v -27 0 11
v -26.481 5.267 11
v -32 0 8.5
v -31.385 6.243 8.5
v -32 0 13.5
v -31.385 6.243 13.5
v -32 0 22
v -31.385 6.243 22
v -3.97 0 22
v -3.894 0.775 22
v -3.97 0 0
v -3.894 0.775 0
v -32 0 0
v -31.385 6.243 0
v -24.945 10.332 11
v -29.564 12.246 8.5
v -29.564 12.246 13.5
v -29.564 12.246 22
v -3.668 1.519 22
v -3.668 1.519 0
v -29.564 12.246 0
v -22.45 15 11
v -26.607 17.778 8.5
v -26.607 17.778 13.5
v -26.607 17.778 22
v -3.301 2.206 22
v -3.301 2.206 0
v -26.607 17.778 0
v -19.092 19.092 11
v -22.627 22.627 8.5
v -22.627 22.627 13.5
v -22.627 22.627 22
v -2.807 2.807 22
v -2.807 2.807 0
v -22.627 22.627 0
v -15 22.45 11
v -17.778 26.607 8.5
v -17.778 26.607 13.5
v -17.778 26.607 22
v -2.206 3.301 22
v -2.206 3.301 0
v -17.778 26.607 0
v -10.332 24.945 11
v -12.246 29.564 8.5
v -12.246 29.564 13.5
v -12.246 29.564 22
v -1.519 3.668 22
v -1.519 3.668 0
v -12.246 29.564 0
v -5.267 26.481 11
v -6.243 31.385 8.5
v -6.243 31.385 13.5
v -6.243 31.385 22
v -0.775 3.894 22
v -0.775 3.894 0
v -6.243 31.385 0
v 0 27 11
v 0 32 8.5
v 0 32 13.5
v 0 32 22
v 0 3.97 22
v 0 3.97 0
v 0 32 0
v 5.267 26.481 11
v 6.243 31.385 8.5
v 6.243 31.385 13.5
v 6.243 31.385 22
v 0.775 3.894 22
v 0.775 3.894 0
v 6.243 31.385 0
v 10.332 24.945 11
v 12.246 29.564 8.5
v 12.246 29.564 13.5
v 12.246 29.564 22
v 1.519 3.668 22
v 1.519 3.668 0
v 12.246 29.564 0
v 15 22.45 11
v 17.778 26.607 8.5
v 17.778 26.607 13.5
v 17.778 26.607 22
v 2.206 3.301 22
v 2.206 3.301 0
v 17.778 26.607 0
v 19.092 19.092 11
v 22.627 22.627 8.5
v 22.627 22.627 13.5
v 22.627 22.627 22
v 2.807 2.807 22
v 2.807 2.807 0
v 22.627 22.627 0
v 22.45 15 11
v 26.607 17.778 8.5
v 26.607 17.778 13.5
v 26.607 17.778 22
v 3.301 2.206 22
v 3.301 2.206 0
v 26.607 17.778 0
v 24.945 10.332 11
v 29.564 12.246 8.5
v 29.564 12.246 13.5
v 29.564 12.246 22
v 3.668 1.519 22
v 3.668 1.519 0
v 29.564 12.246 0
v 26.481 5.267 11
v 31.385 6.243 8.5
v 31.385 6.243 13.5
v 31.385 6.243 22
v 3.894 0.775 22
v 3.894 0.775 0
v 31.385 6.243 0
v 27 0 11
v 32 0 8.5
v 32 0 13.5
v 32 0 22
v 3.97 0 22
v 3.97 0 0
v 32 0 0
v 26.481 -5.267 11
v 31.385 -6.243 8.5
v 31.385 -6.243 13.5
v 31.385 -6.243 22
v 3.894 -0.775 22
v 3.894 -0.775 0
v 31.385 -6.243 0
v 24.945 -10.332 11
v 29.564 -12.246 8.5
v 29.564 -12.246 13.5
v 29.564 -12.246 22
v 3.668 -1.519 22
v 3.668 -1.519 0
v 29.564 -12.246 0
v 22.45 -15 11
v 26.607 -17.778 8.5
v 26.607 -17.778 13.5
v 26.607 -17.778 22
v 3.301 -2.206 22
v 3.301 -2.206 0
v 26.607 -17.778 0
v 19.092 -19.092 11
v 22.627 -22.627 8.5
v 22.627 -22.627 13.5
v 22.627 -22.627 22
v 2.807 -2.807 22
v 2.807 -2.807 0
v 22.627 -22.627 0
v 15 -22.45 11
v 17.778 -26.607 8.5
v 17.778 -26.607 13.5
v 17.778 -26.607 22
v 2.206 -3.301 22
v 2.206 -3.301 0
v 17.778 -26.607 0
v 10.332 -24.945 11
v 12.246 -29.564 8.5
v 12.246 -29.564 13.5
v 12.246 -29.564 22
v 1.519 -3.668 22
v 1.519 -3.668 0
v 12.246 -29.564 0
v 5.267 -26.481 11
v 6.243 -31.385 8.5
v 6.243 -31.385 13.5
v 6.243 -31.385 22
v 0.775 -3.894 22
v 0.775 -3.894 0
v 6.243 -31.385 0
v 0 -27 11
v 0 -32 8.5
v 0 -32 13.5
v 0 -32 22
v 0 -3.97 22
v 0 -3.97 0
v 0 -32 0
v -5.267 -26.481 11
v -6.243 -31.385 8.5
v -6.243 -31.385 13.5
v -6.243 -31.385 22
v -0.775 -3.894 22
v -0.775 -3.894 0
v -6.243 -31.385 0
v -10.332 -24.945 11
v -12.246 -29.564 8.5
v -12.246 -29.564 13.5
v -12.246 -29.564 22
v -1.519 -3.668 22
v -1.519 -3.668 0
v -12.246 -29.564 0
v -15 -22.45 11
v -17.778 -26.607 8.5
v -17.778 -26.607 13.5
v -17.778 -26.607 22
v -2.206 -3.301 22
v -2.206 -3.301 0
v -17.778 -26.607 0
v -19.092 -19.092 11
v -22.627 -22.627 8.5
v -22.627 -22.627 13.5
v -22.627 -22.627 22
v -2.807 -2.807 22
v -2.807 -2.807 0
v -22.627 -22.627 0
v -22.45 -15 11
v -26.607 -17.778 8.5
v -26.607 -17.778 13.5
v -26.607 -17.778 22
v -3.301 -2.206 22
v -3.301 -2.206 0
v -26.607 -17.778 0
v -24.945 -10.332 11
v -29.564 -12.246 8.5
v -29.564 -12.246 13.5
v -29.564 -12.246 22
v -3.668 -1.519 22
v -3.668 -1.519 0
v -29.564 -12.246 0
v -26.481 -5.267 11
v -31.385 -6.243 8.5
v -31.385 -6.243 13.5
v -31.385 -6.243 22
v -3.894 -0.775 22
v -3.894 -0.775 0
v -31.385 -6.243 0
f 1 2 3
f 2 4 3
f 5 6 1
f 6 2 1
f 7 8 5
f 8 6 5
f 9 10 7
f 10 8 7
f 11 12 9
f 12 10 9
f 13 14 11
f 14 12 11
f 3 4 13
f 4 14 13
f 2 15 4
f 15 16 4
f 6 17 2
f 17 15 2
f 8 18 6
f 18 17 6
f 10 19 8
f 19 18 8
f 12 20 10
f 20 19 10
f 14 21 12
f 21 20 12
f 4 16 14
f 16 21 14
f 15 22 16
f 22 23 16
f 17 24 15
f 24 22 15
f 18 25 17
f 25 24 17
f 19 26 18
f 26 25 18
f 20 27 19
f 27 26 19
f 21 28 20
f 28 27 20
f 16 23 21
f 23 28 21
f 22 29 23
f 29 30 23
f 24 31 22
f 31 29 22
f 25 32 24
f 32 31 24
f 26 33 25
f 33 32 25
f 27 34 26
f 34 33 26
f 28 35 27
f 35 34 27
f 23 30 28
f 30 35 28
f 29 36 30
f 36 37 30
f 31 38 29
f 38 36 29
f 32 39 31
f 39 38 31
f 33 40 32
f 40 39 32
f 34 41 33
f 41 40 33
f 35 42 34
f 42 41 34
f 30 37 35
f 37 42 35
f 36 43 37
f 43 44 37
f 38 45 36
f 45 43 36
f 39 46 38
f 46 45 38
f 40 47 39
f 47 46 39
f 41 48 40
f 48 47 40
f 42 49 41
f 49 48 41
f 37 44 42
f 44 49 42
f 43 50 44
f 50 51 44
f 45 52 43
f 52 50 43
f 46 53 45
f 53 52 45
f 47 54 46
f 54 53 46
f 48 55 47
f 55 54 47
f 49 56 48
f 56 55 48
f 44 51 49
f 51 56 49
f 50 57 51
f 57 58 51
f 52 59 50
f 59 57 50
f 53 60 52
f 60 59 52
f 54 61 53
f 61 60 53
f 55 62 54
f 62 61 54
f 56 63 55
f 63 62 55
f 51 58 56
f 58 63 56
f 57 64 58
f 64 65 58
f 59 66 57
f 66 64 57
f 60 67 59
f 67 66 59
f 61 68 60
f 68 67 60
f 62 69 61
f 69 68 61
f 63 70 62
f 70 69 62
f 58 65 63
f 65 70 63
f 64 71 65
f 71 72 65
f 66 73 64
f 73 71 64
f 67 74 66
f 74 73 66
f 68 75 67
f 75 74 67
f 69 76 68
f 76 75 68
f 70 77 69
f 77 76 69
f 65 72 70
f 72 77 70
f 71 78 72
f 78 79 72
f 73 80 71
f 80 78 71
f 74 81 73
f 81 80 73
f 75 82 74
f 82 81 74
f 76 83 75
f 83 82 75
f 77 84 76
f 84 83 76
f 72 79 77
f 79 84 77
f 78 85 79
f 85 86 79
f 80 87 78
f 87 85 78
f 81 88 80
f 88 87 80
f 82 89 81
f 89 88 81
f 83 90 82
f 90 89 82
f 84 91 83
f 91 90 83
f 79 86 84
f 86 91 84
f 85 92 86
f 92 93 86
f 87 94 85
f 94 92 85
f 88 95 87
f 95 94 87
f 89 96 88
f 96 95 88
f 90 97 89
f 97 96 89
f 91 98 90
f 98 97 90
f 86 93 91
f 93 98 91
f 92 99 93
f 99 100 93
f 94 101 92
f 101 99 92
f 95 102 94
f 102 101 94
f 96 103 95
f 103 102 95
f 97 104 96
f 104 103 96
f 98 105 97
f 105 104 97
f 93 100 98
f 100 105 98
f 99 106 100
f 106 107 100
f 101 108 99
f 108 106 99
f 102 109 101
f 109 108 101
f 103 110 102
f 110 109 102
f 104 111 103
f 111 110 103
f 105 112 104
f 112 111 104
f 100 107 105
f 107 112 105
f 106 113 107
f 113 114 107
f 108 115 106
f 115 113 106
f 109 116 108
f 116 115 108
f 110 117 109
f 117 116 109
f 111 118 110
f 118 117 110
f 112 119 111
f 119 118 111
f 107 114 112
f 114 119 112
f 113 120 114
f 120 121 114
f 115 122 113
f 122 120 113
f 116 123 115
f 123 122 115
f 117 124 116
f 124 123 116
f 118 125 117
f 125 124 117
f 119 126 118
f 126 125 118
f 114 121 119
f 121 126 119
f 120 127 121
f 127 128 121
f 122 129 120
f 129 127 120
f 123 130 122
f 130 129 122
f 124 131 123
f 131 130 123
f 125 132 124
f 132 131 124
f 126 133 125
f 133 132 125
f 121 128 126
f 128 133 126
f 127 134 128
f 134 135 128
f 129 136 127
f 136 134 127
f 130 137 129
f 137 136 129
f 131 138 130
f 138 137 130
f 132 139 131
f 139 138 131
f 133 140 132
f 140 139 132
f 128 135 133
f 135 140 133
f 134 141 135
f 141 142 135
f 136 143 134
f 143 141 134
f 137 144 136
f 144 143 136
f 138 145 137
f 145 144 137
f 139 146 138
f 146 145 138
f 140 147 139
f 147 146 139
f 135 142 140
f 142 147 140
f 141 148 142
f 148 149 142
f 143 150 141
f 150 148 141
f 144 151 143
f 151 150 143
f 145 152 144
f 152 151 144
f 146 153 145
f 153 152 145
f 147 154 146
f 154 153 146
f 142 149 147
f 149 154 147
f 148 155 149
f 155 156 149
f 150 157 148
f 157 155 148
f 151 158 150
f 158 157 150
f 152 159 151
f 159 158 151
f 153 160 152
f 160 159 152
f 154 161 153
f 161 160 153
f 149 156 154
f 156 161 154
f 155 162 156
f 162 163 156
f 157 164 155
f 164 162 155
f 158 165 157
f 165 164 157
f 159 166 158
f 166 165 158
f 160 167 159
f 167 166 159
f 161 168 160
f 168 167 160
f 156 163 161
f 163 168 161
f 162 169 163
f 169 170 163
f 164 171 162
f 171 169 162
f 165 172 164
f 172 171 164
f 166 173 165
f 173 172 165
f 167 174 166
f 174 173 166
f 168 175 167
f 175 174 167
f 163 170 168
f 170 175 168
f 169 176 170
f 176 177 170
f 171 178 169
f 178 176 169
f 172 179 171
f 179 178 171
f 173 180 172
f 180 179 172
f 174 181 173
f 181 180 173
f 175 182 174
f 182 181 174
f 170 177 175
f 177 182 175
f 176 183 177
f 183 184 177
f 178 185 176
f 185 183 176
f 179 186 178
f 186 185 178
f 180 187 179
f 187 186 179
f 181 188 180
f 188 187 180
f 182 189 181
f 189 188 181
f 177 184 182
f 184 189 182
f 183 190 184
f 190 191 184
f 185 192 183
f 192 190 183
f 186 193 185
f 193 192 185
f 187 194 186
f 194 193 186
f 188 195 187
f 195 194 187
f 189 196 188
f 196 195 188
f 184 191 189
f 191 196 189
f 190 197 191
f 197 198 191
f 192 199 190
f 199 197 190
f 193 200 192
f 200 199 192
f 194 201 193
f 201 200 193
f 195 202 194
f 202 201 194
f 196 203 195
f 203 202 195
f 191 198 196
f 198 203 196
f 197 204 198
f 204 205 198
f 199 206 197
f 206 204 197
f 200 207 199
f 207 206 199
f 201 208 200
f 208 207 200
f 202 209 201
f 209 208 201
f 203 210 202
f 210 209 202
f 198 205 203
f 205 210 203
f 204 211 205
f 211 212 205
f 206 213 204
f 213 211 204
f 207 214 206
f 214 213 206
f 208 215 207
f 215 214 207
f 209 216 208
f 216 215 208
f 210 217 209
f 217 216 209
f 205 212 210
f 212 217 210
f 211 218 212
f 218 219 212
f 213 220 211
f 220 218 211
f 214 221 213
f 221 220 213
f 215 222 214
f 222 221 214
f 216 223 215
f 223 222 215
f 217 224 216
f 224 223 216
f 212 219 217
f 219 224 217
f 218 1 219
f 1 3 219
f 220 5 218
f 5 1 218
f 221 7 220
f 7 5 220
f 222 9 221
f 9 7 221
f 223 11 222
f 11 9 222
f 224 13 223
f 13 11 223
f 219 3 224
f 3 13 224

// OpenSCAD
$fn = 32;

// ----------------------------------------------------------------------
// Belt roller: 64 mm barrel, 22 mm wide, bore 7.94 mm
// ----------------------------------------------------------------------

// --- parameters (mm) ---
bore_d = 7.94;            // bore
barrel_d = 64;            // barrel diameter
roller_w = 22;            // roller width
groove_w = 5;             // guide groove width
groove_d = 5;             // guide groove depth

roller_profile = [[3.97, 0], [32, 0], [32, 8.5], [27, 11], [32, 13.5], [32, 22], [3.97, 22]];

/* the profile stays clear of the axis, so the bore comes out of the revolve */
rotate_extrude() polygon(roller_profile);
